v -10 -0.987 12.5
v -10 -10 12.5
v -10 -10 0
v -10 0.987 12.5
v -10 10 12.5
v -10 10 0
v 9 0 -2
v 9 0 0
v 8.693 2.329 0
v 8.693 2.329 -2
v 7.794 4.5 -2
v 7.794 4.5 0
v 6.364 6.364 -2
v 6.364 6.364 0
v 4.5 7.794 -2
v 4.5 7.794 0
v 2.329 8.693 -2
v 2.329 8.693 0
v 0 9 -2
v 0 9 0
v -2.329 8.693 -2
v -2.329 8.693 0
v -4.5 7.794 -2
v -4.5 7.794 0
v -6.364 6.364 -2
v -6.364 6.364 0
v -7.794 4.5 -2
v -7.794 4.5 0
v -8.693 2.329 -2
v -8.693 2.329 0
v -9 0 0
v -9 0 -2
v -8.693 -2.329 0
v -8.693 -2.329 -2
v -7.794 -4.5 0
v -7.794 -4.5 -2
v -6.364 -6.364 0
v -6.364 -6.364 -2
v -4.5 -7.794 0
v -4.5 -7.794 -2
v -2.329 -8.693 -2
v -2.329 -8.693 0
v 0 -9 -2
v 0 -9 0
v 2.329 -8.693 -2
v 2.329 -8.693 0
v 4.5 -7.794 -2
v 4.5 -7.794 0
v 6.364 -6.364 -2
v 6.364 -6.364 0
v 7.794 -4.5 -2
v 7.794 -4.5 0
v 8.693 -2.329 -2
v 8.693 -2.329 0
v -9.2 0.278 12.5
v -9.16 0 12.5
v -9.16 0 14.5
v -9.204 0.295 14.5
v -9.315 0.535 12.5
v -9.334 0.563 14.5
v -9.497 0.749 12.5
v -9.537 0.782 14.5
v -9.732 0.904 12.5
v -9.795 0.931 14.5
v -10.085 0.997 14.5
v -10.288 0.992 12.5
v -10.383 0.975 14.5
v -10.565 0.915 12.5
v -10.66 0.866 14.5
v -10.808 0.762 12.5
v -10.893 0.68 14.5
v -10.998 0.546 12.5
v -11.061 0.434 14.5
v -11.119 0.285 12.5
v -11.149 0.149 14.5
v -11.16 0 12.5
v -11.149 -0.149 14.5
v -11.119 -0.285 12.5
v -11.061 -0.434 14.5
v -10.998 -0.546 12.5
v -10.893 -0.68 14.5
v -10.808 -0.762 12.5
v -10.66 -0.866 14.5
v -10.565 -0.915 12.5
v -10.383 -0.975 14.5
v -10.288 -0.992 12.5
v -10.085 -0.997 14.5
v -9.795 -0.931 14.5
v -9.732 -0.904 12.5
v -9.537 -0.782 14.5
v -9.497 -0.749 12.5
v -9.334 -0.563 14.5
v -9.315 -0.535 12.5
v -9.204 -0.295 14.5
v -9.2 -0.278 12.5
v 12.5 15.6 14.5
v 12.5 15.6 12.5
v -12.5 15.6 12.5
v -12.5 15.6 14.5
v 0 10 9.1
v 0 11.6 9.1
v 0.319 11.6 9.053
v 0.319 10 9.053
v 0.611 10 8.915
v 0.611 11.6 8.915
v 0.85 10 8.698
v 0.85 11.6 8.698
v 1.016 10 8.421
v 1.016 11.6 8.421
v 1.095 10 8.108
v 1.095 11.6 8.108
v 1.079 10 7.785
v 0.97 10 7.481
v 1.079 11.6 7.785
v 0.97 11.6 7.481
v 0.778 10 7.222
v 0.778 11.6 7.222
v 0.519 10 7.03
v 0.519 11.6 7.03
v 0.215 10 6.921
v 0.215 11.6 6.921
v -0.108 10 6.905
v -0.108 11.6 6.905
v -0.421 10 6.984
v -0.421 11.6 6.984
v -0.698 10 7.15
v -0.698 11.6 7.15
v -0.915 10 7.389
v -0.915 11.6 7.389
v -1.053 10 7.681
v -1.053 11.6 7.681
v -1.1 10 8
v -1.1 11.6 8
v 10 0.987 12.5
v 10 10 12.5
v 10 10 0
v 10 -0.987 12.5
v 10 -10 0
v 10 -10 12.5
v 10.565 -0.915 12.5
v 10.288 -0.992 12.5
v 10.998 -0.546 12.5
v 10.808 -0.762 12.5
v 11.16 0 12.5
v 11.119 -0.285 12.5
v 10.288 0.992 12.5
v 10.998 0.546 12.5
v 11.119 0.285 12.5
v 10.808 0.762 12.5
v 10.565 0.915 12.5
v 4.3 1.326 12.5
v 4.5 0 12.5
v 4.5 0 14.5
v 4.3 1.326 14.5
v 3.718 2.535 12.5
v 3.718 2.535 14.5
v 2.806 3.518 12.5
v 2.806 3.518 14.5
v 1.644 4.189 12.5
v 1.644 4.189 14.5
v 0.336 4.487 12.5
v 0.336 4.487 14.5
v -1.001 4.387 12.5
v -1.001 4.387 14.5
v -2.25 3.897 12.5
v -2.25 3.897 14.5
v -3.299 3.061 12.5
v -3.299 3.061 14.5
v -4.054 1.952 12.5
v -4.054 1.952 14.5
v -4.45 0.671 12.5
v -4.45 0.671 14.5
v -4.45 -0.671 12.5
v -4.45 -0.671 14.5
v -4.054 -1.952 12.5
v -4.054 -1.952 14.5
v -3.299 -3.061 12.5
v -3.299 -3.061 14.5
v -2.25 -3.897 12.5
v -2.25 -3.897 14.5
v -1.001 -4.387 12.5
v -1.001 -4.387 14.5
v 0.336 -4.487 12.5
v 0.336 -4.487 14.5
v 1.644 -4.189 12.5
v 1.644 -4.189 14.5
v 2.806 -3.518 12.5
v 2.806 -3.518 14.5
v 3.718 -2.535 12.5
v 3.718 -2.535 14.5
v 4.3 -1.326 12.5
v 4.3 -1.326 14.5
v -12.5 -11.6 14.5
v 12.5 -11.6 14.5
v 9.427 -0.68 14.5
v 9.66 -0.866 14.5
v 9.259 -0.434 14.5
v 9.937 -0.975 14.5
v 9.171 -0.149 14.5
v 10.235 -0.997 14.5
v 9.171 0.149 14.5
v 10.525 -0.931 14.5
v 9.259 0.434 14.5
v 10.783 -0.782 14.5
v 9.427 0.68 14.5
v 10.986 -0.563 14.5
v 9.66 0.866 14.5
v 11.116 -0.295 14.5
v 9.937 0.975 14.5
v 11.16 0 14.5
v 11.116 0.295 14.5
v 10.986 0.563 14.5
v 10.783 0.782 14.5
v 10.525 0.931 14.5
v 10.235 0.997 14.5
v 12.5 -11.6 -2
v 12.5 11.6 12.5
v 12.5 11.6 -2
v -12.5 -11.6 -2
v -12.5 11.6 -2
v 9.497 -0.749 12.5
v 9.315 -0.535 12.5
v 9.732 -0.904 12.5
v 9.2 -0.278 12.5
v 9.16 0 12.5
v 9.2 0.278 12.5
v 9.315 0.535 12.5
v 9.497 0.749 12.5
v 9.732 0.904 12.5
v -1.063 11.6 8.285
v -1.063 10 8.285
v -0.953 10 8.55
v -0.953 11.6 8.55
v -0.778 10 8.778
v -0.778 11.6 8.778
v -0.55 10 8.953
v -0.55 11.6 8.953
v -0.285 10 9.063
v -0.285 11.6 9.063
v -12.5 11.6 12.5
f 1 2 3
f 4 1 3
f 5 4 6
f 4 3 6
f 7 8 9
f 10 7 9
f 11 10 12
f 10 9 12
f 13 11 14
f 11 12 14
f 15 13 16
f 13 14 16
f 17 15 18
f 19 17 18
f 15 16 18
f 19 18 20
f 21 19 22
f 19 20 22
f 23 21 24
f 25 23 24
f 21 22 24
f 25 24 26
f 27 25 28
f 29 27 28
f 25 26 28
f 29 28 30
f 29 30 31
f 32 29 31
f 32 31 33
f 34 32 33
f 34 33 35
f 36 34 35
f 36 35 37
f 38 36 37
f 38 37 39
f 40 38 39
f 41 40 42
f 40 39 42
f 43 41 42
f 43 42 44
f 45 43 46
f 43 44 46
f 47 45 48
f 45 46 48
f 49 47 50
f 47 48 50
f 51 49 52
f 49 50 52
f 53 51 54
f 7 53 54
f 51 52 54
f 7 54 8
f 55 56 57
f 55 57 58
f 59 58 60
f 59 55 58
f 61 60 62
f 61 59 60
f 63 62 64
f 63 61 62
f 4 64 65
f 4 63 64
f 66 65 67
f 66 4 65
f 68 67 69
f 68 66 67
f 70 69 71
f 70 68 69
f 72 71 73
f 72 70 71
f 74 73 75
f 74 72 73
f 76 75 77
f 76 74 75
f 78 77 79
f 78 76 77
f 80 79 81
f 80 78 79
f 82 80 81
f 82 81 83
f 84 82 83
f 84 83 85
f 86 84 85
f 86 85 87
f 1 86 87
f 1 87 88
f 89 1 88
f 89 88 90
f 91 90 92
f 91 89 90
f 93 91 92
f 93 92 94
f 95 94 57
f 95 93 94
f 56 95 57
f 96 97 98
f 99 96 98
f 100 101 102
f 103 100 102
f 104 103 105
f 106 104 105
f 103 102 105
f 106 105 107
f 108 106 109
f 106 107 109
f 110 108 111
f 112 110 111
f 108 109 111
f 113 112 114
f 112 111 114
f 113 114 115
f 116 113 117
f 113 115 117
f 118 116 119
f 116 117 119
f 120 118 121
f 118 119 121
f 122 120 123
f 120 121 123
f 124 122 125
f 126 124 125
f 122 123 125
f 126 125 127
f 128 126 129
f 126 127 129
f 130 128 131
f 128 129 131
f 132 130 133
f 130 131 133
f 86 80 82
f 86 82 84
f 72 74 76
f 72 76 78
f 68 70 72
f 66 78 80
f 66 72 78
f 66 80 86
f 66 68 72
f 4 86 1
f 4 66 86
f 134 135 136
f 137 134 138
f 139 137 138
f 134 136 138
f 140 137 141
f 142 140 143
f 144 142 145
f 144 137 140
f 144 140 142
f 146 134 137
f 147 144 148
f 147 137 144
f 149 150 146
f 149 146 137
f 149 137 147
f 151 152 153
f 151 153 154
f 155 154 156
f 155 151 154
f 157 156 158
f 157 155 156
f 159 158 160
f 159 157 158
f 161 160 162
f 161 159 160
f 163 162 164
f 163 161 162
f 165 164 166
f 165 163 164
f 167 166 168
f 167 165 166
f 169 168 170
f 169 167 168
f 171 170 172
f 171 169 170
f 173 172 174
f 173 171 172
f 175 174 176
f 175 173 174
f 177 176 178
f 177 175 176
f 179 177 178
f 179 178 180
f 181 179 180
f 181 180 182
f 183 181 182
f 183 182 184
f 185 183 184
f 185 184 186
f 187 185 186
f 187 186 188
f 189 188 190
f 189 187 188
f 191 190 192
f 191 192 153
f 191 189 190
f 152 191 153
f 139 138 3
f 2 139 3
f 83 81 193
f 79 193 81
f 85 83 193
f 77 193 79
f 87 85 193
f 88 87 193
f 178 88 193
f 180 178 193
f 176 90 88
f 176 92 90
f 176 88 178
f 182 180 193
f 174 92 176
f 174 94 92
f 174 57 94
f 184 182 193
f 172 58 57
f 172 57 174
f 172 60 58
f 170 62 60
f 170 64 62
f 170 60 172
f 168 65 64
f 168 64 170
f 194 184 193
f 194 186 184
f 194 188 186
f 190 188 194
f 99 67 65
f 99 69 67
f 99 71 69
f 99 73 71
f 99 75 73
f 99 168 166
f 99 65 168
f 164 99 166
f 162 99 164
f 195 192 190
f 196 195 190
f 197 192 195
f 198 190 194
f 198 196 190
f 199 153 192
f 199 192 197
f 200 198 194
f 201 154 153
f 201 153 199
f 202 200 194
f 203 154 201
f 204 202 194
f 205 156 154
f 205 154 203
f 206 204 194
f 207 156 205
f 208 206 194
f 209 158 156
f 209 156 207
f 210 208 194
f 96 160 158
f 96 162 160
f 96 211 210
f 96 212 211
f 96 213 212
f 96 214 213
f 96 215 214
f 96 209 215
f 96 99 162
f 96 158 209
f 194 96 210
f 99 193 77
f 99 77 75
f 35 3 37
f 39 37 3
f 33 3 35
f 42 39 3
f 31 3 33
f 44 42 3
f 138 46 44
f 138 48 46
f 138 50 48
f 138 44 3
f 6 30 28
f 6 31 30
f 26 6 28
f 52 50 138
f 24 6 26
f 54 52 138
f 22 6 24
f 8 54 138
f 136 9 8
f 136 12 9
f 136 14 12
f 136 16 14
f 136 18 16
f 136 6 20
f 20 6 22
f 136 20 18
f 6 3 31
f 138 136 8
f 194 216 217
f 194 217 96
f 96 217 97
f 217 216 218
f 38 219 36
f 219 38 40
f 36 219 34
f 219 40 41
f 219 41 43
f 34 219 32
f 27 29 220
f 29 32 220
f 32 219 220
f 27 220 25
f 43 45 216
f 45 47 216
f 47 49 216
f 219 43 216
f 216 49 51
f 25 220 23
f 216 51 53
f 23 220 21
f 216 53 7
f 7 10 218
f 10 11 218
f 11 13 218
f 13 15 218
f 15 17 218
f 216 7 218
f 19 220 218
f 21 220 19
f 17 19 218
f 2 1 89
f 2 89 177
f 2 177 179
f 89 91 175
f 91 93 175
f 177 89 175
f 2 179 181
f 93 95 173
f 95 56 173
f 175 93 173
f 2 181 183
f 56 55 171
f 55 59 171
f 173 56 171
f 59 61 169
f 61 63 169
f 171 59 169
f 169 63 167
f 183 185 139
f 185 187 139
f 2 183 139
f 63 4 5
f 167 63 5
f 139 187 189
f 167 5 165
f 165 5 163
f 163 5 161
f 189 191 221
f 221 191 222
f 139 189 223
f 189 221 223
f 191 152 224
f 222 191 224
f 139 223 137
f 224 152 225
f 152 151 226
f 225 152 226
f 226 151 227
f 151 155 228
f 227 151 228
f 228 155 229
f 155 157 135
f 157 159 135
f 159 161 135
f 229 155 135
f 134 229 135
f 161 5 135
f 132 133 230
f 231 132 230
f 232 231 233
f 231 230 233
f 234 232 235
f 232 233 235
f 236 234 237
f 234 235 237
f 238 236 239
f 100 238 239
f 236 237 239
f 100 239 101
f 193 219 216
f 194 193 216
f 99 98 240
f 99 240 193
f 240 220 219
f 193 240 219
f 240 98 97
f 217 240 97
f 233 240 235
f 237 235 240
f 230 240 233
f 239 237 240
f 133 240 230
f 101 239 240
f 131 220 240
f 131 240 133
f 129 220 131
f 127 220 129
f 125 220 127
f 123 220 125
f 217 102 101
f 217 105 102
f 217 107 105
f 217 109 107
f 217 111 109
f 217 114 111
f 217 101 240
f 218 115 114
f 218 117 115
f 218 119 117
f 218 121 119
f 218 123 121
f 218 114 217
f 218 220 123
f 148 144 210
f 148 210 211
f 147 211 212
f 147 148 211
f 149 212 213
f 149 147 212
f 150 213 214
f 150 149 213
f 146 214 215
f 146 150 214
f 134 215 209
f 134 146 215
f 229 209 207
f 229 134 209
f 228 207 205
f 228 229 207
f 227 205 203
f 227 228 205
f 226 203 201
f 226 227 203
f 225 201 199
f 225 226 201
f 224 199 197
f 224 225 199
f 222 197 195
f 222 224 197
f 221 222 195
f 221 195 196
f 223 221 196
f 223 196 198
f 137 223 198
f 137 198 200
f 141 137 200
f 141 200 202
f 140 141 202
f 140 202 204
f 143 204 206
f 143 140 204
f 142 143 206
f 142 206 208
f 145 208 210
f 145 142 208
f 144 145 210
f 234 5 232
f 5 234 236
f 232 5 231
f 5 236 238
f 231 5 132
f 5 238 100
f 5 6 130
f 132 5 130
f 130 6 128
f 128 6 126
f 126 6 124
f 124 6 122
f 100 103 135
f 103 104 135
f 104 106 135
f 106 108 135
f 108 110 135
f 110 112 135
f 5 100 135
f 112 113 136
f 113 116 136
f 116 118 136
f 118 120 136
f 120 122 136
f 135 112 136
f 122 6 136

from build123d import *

# Parameters (mm, degrees)
F0_W     = 25
F0_H     = 23.2
F0_R     = 9
F1_DEPTH = 2
F2_DEPTH = 12.5
F4_DEPTH = 4
F5_R     = 1
F5_R_2   = 4.5
F6_DEPTH = 2


with BuildPart() as f1:
    # F0 (on Top) → F1 (new body)
    with BuildSketch(Plane.XY):
        Rectangle(F0_W, F0_H)
        Polygon((10, 10), (10, 0), (10, -10), (0, -10), (-10, -10), (-10, 0), (-10, 10), (0, 10), align=None, mode=Mode.SUBTRACT)
        with BuildLine():
            ThreePointArc((0, -10), (7.0710678119, -7.0710678119), (10, 0))
            ThreePointArc((10, 0), (7.0710678119, 7.0710678119), (0, 10))
            ThreePointArc((0, 10), (-7.0710678119, 7.0710678119), (-10, 0))
            ThreePointArc((-10, 0), (-7.0710678119, -7.0710678119), (0, -10))
        make_face()
        Circle(F0_R, mode=Mode.SUBTRACT)
        with BuildLine():
            Line((-10, -10), (0, -10))
            ThreePointArc((0, -10), (-7.0710678119, -7.0710678119), (-10, 0))
            Line((-10, 0), (-10, -10))
        make_face()
        with BuildLine():
            ThreePointArc((-10, 0), (-7.0710678119, 7.0710678119), (0, 10))
            Line((0, 10), (-10, 10))
            Line((-10, 10), (-10, 0))
        make_face()
        with BuildLine():
            ThreePointArc((0, 10), (7.0710678119, 7.0710678119), (10, 0))
            Line((10, 0), (10, 10))
            Line((10, 10), (0, 10))
        make_face()
        with BuildLine():
            Line((10, -10), (10, 0))
            ThreePointArc((10, 0), (7.0710678119, -7.0710678119), (0, -10))
            Line((0, -10), (10, -10))
        make_face()
    extrude(amount=-F1_DEPTH)

    # F0 (on Top) → F2 (join)
    with BuildSketch(Plane.XY):
        Rectangle(F0_W, F0_H)
        Polygon((10, 10), (10, 0), (10, -10), (0, -10), (-10, -10), (-10, 0), (-10, 10), (0, 10), align=None, mode=Mode.SUBTRACT)
    extrude(amount=F2_DEPTH)

    # F3 (on face) → F4 (cut)
    with BuildSketch(Plane(origin=(0, 11.6, 0), x_dir=(-1, 0, 0), z_dir=(0, 1, 0))):
        with BuildLine():
            ThreePointArc((0, 9.1), (-0.7778174593, 7.2221825407), (1.1, 8))
            ThreePointArc((1.1, 8), (0.7778174593, 8.7778174593), (0, 9.1))
        make_face()
    extrude(amount=-F4_DEPTH, mode=Mode.SUBTRACT)

    # F5 (on face) → F6 (join)
    with BuildSketch(Plane.XY.offset(12.5)):
        Polygon((-12.5, 11.6), (-12.5, -11.6), (12.5, -11.6), (12.5, 15.6), (-12.5, 15.6), align=None)
        with Locations((-10.16, 0)):
            Circle(F5_R, mode=Mode.SUBTRACT)
        Circle(F5_R_2, mode=Mode.SUBTRACT)
        with Locations((10.16, 0)):
            Circle(F5_R, mode=Mode.SUBTRACT)
    extrude(amount=F6_DEPTH)


solid = f1.part
